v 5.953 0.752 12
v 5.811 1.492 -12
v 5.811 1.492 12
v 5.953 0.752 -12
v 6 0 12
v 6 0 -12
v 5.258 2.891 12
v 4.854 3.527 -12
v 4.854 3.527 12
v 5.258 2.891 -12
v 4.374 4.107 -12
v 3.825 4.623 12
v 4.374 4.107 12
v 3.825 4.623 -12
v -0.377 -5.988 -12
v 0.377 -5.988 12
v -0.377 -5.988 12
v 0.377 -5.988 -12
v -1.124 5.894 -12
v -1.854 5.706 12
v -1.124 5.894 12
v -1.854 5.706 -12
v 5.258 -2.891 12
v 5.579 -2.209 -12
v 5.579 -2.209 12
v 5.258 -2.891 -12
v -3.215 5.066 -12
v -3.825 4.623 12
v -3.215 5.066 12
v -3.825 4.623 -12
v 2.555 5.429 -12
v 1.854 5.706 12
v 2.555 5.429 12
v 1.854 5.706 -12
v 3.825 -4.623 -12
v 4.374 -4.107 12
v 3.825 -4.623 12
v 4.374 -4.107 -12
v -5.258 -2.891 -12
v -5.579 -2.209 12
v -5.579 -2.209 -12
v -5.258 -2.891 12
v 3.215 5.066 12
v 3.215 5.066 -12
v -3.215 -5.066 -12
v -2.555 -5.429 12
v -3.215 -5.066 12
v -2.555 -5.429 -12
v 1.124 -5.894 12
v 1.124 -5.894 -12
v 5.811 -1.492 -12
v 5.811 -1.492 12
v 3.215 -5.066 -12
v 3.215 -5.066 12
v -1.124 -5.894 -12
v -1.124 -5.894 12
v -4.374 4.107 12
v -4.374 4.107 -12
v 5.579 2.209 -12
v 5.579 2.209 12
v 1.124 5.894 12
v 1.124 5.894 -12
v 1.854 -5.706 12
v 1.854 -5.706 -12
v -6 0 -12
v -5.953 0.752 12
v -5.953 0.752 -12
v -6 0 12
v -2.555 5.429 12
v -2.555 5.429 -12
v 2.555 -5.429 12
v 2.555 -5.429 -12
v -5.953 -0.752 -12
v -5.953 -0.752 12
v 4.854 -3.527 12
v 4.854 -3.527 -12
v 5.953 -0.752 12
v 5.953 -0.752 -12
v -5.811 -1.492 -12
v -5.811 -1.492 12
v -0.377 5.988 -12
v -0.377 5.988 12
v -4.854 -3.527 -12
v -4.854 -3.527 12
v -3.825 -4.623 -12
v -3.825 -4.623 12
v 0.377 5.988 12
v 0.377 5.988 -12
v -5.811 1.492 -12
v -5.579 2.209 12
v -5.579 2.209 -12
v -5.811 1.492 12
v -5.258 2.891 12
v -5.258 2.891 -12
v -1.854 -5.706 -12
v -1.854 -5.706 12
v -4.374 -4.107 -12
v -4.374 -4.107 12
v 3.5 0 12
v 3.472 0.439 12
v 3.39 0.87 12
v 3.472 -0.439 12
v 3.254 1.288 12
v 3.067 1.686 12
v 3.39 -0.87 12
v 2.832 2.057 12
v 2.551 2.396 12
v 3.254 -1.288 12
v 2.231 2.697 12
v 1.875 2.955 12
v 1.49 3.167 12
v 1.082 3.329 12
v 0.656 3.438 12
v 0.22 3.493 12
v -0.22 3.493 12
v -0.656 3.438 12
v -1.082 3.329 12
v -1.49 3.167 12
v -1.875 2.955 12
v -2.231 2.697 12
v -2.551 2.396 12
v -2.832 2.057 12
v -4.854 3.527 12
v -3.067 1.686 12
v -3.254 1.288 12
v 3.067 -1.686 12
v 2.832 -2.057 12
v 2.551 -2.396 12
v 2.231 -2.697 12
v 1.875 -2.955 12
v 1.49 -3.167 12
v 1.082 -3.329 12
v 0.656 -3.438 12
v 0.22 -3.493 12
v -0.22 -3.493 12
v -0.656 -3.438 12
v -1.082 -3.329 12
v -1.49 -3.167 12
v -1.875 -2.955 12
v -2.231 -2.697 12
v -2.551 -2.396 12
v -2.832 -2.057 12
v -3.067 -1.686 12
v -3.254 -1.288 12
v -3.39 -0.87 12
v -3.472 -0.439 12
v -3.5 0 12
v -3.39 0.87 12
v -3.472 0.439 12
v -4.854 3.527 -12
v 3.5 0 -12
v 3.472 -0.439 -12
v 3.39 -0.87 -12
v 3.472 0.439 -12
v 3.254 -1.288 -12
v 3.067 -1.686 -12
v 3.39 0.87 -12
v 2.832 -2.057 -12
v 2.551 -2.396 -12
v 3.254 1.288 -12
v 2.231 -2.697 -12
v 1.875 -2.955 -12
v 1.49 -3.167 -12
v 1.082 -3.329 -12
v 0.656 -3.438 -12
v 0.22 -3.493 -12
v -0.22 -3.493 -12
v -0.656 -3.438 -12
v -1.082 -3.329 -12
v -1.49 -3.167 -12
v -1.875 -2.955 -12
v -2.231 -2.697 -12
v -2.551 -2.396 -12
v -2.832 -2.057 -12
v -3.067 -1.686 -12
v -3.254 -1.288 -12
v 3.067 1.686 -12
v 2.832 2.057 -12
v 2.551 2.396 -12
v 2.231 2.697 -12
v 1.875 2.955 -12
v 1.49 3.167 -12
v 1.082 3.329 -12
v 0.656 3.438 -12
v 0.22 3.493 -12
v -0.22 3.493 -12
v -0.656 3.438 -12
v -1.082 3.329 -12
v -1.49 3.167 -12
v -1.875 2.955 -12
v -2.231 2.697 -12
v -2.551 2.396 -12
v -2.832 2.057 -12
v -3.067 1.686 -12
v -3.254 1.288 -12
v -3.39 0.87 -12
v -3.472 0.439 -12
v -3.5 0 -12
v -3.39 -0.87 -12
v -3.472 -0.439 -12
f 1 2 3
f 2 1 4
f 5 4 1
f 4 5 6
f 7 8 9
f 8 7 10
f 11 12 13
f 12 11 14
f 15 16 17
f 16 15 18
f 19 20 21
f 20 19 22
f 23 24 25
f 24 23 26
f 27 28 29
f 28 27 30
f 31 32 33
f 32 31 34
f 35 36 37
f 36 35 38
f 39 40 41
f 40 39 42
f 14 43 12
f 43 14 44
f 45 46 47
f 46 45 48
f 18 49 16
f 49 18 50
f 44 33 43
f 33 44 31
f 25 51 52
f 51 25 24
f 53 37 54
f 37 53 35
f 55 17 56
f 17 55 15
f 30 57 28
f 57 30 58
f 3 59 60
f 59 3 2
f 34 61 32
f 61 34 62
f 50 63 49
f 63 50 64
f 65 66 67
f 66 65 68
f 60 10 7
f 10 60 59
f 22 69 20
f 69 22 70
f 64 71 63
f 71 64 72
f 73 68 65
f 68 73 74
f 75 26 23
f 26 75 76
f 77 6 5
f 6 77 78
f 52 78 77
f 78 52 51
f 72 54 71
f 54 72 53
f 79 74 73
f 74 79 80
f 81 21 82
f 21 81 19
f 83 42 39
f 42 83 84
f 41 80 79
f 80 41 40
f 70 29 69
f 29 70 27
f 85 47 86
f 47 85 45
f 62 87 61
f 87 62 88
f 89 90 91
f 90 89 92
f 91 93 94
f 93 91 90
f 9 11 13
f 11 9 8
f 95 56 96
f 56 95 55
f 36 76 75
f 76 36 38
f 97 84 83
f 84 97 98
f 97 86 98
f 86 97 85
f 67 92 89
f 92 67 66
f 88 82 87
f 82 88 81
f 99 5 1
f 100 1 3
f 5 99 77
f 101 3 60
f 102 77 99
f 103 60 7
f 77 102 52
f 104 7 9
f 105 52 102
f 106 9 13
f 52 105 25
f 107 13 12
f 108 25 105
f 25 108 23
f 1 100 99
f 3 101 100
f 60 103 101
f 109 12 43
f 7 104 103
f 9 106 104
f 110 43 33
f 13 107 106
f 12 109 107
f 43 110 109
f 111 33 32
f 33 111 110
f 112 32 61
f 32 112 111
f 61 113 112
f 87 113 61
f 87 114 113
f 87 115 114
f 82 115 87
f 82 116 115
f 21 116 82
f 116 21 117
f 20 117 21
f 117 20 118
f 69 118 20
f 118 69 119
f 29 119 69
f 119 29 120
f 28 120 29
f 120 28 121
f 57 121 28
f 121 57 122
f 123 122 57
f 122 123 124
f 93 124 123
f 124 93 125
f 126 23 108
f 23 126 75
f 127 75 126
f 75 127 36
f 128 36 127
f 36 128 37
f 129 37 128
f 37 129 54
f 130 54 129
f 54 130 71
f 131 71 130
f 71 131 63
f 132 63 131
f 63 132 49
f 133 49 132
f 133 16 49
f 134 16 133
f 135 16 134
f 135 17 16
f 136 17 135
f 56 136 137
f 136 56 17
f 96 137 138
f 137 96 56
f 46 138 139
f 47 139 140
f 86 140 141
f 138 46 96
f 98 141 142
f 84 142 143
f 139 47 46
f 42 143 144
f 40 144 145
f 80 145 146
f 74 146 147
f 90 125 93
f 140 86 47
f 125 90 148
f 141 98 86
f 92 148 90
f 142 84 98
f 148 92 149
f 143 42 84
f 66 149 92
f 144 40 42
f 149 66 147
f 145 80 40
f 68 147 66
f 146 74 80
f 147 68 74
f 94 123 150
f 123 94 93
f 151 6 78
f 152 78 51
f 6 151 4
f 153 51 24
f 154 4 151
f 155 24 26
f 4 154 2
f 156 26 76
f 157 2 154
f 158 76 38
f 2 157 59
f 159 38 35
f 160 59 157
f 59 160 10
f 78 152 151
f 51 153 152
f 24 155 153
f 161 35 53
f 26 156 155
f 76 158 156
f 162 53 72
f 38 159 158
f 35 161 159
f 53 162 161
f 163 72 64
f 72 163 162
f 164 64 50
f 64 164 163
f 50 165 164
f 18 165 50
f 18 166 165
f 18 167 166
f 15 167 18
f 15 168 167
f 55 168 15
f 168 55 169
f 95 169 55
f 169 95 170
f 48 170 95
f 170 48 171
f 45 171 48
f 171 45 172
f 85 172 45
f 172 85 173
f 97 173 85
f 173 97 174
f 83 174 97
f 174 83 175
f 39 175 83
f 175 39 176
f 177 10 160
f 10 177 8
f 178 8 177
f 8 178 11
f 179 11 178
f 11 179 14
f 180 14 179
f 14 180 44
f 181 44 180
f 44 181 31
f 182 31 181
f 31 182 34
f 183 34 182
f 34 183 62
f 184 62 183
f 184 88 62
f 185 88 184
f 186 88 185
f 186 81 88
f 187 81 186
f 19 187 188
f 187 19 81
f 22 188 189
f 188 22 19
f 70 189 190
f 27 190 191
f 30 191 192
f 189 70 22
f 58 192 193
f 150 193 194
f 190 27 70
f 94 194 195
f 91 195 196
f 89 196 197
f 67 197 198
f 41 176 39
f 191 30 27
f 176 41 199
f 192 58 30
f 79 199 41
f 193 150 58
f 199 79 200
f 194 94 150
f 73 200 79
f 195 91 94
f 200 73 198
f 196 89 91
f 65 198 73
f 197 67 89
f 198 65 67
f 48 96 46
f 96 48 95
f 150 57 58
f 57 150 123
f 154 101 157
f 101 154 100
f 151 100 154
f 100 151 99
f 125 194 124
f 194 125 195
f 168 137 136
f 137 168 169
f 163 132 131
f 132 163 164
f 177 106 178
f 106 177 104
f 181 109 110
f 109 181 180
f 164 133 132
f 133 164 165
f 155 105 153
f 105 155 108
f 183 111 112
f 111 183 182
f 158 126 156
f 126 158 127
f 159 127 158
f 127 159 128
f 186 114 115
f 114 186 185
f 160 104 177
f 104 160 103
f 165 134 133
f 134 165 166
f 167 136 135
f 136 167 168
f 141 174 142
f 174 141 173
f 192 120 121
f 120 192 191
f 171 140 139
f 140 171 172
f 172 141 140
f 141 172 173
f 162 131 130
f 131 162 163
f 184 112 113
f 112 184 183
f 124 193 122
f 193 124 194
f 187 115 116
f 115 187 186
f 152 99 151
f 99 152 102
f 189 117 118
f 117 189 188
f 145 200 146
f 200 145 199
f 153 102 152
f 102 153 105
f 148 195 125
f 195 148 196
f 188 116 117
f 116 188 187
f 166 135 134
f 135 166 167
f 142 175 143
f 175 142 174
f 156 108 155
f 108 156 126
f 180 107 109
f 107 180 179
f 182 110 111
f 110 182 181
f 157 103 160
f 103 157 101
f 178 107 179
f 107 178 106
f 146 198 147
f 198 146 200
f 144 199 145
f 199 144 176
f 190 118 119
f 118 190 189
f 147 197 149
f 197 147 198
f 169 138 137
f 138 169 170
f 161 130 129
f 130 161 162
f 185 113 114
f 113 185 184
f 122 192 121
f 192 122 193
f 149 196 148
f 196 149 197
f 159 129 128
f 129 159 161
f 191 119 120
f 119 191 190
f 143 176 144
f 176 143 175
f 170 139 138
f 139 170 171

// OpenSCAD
$fn = 50;


difference() {
	union() {
		translate(v = [0, 0, -12.0000000000]) {
			cylinder(h = 24, r = 6.0000000000);
		}
	}
	union() {
		translate(v = [0, 0, -100.0000000000]) {
			cylinder(h = 200, r = 3.5000000000);
		}
	}
}
